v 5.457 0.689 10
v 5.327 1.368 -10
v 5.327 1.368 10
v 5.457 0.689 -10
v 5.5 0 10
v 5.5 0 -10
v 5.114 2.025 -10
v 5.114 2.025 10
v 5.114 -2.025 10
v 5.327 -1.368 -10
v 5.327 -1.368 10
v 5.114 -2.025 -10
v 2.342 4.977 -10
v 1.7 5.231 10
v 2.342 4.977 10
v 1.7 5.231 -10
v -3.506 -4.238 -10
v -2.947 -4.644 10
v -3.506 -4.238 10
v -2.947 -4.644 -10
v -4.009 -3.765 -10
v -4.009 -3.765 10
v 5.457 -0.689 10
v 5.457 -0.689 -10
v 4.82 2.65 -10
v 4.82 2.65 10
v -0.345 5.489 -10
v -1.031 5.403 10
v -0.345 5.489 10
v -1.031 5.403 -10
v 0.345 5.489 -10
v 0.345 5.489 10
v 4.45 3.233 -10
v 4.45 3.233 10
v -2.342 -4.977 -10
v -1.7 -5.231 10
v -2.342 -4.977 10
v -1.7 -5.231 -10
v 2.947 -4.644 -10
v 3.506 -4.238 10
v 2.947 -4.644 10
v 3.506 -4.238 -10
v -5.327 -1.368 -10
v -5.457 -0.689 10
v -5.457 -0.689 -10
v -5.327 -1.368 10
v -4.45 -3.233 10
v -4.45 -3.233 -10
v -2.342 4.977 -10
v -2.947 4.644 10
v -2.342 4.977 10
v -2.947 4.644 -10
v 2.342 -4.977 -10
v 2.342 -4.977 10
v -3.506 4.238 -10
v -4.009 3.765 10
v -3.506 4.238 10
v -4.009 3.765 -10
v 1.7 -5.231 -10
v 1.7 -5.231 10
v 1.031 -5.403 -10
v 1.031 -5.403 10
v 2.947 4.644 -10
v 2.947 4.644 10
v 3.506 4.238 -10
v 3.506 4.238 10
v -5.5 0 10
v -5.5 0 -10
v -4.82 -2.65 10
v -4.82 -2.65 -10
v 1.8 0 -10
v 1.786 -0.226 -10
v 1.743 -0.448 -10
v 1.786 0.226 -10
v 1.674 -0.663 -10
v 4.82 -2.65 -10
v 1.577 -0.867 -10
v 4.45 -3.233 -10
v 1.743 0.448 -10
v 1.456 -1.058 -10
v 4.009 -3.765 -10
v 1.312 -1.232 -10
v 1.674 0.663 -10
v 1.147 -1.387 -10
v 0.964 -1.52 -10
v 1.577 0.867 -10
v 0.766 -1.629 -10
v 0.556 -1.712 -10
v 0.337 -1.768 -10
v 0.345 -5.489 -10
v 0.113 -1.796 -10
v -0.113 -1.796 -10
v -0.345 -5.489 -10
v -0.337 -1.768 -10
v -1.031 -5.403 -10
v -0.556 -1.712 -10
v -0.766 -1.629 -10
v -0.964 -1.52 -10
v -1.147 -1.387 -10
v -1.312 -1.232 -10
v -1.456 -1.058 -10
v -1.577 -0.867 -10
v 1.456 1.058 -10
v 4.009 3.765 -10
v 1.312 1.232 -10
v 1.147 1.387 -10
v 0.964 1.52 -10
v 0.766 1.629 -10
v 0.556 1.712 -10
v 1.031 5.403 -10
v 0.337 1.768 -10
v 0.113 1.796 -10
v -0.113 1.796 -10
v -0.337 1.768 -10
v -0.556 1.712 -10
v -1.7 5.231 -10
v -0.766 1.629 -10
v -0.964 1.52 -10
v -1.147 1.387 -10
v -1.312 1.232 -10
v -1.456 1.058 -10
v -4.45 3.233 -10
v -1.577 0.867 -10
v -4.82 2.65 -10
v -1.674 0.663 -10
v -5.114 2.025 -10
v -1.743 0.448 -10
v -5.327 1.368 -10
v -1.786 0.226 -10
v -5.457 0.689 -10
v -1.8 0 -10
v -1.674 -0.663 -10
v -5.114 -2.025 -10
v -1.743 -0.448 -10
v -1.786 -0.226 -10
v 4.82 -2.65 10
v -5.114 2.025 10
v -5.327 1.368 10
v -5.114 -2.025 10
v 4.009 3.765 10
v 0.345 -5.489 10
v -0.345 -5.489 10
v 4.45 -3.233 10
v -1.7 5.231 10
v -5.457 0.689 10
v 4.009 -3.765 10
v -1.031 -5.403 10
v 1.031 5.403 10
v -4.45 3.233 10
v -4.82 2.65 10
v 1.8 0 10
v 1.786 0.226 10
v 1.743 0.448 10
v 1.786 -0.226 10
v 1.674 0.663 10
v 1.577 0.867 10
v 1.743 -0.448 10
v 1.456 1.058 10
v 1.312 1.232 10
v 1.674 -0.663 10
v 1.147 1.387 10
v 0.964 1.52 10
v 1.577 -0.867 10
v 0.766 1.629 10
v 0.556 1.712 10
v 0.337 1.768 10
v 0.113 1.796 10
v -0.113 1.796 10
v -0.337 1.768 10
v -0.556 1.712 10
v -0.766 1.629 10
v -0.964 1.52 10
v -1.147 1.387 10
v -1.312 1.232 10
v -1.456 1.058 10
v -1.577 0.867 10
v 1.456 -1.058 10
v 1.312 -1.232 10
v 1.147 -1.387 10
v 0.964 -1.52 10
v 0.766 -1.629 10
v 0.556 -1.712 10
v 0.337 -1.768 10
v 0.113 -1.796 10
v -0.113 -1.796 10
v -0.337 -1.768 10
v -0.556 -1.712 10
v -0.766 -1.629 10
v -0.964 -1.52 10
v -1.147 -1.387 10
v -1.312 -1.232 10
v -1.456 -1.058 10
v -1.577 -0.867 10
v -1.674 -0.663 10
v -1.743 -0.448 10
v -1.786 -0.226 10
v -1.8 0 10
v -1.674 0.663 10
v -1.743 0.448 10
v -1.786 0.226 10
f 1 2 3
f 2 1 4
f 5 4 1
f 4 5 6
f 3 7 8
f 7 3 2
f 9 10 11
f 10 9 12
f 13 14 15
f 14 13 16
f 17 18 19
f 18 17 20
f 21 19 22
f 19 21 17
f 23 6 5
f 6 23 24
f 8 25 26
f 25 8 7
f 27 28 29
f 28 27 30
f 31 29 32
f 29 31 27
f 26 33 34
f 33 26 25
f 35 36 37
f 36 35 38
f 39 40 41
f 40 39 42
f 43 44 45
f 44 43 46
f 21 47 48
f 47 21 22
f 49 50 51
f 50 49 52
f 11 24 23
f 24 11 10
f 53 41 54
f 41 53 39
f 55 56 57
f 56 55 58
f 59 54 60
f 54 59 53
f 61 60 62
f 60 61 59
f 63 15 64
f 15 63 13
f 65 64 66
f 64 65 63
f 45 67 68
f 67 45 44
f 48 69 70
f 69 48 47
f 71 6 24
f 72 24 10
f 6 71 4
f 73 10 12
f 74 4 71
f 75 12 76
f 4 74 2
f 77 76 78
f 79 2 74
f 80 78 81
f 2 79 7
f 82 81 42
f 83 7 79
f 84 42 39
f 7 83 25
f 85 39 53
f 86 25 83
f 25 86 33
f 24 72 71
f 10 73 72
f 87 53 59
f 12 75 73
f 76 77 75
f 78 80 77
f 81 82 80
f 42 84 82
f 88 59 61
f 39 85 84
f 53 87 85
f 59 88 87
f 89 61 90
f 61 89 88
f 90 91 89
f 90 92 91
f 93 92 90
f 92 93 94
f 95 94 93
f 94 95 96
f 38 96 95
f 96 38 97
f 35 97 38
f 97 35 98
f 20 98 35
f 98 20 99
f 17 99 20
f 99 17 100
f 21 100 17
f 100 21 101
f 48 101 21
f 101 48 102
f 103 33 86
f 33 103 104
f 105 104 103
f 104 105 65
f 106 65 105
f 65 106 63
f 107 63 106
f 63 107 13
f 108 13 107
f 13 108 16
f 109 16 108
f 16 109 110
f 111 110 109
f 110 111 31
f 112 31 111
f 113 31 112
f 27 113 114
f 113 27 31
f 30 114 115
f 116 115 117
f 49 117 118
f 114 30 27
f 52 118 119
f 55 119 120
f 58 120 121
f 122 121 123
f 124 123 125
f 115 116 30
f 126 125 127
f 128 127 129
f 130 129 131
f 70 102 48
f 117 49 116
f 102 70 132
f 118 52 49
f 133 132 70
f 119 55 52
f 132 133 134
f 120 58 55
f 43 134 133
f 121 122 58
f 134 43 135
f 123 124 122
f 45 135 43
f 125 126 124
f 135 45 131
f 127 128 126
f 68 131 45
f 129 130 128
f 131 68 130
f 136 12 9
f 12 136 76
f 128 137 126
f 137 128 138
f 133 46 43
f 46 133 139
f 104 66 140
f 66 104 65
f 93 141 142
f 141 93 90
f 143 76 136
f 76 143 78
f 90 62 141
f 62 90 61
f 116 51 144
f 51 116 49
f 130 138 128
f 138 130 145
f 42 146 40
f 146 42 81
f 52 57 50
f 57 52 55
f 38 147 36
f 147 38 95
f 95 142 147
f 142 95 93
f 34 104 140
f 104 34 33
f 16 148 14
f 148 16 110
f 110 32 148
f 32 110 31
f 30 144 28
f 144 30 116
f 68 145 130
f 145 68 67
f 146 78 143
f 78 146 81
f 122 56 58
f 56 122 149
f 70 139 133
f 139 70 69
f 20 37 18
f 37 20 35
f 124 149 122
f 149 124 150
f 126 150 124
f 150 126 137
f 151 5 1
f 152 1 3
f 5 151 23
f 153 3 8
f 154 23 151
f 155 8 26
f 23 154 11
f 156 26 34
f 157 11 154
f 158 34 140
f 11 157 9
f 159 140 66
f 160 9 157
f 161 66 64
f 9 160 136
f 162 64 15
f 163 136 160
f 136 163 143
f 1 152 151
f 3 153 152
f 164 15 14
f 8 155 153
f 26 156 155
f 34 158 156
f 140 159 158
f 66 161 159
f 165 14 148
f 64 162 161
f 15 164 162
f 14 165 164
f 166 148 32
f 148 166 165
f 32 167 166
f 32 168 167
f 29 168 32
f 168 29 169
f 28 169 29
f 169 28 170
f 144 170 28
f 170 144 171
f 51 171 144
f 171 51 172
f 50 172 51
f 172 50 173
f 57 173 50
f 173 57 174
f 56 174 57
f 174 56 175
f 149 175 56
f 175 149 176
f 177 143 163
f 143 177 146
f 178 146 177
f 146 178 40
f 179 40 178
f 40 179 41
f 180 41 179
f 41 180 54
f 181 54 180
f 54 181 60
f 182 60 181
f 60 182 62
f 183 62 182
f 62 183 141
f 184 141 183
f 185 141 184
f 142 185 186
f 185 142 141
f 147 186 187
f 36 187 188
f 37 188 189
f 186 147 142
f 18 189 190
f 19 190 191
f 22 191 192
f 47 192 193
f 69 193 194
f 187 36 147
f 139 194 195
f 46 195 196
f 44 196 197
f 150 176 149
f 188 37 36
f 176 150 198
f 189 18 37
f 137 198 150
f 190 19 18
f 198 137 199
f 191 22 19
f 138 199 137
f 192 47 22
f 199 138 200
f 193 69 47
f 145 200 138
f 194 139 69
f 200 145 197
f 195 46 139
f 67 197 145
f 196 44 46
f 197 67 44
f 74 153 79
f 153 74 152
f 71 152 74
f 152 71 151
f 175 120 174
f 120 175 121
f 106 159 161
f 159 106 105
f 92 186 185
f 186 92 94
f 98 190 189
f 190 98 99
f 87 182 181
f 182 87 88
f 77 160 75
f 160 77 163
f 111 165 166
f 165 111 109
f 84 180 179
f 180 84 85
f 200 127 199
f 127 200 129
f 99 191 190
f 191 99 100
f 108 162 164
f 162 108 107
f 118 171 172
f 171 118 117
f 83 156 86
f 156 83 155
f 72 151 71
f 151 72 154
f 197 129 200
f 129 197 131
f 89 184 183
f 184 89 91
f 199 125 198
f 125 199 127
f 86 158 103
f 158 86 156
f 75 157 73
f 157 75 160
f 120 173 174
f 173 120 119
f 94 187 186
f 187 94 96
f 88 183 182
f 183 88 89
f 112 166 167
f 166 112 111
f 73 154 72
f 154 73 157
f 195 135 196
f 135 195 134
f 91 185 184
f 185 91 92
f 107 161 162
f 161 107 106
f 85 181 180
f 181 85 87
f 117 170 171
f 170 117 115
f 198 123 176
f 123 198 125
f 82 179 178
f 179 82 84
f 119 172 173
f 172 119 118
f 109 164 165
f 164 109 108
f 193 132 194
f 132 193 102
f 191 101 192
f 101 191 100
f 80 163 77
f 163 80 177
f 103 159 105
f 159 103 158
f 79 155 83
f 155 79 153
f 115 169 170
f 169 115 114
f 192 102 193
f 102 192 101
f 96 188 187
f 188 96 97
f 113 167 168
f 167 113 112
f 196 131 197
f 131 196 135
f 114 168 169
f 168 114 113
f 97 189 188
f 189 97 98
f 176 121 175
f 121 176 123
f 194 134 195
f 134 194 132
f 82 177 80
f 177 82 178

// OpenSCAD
$fn = 50;


difference() {
	union() {
		translate(v = [0, 0, -10.0000000000]) {
			cylinder(h = 20, r = 5.5000000000);
		}
	}
	union() {
		#translate(v = [0, 0, -100.0000000000]) {
			cylinder(h = 200, r = 1.8000000000);
		}
	}
}
